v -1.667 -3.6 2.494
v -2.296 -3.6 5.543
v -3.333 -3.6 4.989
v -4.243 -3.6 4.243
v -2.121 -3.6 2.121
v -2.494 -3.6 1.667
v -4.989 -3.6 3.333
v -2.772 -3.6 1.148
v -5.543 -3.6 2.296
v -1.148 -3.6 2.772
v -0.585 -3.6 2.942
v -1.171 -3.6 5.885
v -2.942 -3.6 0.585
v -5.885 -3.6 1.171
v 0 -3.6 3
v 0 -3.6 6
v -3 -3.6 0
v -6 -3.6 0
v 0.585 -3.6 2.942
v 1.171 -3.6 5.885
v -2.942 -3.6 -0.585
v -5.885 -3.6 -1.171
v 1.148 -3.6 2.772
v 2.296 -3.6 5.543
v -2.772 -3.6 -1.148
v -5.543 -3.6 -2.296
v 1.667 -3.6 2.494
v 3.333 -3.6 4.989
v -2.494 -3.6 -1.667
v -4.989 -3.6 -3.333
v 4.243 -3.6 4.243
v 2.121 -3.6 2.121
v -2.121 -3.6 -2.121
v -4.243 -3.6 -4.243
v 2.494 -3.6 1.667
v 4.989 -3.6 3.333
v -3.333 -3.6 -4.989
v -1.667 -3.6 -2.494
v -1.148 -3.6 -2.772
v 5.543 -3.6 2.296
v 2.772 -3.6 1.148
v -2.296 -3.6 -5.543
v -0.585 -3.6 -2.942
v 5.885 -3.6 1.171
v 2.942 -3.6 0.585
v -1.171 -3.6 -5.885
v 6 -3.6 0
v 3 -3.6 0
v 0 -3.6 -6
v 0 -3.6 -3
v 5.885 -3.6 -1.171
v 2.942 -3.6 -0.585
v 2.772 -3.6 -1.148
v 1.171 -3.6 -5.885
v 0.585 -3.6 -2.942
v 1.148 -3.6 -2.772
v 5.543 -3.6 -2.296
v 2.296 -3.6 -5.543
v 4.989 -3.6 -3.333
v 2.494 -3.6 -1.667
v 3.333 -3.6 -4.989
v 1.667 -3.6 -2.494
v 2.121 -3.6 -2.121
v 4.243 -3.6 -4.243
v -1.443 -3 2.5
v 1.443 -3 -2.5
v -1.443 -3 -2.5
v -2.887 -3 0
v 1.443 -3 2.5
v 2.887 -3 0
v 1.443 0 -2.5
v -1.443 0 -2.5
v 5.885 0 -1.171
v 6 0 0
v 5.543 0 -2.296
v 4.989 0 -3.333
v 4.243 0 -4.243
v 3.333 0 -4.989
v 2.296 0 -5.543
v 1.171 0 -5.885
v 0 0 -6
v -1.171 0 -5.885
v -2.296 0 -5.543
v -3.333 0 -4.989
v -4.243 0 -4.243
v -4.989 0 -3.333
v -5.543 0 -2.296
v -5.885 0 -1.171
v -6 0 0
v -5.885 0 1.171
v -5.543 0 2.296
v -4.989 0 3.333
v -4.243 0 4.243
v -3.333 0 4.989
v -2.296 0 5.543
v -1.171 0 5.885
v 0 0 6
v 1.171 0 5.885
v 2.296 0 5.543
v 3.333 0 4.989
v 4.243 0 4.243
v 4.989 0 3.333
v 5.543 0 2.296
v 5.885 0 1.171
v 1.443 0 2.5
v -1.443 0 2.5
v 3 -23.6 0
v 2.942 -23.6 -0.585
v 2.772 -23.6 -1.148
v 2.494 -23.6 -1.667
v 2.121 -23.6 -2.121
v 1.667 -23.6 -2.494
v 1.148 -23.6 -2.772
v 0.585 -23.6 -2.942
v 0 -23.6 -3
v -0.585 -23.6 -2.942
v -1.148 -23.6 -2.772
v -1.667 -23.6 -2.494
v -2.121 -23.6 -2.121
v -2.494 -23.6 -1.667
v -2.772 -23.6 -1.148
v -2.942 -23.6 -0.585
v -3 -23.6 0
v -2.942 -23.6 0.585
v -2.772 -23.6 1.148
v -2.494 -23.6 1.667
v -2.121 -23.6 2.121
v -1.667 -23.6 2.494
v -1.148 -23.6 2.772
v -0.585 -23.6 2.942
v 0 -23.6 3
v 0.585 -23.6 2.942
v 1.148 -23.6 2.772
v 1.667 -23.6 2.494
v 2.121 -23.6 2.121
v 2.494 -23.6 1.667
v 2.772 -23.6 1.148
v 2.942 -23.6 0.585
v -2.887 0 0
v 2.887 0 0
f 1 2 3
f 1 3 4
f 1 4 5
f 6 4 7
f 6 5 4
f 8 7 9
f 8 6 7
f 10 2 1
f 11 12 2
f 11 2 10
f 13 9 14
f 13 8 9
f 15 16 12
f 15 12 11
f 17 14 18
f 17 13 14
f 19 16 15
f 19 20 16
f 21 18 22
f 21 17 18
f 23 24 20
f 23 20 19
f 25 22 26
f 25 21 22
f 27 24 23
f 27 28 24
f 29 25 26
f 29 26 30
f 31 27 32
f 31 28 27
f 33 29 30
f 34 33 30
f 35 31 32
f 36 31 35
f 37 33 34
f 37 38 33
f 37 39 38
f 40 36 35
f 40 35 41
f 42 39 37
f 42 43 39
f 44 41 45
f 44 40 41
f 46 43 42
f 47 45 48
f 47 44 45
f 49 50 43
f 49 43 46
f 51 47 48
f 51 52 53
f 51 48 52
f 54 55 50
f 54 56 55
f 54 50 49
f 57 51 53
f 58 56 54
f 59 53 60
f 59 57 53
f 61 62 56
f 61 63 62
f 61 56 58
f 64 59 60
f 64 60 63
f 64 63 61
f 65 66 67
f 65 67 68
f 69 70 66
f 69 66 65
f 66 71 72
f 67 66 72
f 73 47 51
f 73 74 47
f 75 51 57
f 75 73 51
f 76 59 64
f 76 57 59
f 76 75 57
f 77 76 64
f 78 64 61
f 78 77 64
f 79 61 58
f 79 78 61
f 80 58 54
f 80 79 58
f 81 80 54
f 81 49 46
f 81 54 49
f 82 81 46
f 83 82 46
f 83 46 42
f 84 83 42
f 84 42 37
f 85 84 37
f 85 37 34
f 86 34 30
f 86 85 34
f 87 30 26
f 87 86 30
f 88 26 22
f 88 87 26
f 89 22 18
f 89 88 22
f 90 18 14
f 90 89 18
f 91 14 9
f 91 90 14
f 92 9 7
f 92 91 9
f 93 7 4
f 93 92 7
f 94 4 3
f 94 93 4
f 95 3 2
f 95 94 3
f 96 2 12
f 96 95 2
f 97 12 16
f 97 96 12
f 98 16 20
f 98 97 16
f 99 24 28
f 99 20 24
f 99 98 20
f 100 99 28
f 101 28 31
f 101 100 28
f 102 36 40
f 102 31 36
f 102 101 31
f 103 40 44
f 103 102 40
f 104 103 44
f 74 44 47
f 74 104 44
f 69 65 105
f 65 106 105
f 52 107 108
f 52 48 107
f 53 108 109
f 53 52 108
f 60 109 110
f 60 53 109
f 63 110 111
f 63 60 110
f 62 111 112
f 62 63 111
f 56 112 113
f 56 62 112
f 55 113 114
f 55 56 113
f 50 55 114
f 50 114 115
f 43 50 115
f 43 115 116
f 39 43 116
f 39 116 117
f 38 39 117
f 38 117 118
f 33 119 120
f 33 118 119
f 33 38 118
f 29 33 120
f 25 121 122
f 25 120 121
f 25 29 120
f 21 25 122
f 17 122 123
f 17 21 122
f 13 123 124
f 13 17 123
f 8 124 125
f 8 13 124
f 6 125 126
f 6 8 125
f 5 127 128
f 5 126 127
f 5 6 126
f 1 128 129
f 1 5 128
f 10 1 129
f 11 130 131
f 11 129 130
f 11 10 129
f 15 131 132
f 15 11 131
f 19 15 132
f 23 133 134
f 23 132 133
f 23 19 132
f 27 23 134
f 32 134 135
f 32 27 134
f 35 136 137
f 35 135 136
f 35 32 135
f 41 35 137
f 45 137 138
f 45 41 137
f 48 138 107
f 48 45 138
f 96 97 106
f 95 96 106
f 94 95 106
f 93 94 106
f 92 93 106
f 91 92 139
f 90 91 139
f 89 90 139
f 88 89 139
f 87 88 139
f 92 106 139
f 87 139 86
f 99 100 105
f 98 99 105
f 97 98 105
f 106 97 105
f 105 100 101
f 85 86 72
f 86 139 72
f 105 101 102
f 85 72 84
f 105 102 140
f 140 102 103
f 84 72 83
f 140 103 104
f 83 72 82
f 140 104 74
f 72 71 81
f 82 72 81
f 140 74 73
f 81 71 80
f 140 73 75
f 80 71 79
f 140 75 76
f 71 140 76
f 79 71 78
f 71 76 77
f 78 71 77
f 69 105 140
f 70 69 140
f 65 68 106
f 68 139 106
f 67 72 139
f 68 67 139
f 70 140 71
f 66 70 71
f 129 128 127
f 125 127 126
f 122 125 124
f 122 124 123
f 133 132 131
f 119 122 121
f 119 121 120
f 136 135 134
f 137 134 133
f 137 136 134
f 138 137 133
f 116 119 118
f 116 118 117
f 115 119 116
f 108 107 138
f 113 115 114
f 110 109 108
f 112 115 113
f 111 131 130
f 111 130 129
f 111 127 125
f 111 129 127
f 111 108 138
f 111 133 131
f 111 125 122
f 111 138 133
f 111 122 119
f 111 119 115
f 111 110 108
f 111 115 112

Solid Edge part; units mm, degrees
sketch "Sketch1" plane through (0, 0, 0) normal (0, -1, 0) x (1, 0, 0)
  circle A0 centre (0, 0) radius 6
extrude "Protrusion1" add sketch "Sketch1" along normal blind 3.6
sketch "Sketch2" plane through (0, -3.6, 0) normal (0, -1, 0) x (1, 0, 0)
  circle A0 centre (0, 0) radius 3
extrude "Protrusion2" add sketch "Sketch2" along normal blind 20
sketch "Sketch3" plane through (0, 0, 0) normal (0, 1, 0) x (0, 0, -1)
  line L0 (2.5, -1.4434) -> (2.5, 1.4434)
  line L1 (2.5, 1.4434) -> (0, 2.8868)
  line L2 (0, 2.8868) -> (-2.5, 1.4434)
  line L3 (-2.5, 1.4434) -> (-2.5, -1.4434)
  line L4 (-2.5, -1.4434) -> (0, -2.8868)
  line L5 (0, -2.8868) -> (2.5, -1.4434)
extrude "ExtrudedCutout_4" cut sketch "Sketch3" against normal blind 3
properties material "Nylon, general purpose"
